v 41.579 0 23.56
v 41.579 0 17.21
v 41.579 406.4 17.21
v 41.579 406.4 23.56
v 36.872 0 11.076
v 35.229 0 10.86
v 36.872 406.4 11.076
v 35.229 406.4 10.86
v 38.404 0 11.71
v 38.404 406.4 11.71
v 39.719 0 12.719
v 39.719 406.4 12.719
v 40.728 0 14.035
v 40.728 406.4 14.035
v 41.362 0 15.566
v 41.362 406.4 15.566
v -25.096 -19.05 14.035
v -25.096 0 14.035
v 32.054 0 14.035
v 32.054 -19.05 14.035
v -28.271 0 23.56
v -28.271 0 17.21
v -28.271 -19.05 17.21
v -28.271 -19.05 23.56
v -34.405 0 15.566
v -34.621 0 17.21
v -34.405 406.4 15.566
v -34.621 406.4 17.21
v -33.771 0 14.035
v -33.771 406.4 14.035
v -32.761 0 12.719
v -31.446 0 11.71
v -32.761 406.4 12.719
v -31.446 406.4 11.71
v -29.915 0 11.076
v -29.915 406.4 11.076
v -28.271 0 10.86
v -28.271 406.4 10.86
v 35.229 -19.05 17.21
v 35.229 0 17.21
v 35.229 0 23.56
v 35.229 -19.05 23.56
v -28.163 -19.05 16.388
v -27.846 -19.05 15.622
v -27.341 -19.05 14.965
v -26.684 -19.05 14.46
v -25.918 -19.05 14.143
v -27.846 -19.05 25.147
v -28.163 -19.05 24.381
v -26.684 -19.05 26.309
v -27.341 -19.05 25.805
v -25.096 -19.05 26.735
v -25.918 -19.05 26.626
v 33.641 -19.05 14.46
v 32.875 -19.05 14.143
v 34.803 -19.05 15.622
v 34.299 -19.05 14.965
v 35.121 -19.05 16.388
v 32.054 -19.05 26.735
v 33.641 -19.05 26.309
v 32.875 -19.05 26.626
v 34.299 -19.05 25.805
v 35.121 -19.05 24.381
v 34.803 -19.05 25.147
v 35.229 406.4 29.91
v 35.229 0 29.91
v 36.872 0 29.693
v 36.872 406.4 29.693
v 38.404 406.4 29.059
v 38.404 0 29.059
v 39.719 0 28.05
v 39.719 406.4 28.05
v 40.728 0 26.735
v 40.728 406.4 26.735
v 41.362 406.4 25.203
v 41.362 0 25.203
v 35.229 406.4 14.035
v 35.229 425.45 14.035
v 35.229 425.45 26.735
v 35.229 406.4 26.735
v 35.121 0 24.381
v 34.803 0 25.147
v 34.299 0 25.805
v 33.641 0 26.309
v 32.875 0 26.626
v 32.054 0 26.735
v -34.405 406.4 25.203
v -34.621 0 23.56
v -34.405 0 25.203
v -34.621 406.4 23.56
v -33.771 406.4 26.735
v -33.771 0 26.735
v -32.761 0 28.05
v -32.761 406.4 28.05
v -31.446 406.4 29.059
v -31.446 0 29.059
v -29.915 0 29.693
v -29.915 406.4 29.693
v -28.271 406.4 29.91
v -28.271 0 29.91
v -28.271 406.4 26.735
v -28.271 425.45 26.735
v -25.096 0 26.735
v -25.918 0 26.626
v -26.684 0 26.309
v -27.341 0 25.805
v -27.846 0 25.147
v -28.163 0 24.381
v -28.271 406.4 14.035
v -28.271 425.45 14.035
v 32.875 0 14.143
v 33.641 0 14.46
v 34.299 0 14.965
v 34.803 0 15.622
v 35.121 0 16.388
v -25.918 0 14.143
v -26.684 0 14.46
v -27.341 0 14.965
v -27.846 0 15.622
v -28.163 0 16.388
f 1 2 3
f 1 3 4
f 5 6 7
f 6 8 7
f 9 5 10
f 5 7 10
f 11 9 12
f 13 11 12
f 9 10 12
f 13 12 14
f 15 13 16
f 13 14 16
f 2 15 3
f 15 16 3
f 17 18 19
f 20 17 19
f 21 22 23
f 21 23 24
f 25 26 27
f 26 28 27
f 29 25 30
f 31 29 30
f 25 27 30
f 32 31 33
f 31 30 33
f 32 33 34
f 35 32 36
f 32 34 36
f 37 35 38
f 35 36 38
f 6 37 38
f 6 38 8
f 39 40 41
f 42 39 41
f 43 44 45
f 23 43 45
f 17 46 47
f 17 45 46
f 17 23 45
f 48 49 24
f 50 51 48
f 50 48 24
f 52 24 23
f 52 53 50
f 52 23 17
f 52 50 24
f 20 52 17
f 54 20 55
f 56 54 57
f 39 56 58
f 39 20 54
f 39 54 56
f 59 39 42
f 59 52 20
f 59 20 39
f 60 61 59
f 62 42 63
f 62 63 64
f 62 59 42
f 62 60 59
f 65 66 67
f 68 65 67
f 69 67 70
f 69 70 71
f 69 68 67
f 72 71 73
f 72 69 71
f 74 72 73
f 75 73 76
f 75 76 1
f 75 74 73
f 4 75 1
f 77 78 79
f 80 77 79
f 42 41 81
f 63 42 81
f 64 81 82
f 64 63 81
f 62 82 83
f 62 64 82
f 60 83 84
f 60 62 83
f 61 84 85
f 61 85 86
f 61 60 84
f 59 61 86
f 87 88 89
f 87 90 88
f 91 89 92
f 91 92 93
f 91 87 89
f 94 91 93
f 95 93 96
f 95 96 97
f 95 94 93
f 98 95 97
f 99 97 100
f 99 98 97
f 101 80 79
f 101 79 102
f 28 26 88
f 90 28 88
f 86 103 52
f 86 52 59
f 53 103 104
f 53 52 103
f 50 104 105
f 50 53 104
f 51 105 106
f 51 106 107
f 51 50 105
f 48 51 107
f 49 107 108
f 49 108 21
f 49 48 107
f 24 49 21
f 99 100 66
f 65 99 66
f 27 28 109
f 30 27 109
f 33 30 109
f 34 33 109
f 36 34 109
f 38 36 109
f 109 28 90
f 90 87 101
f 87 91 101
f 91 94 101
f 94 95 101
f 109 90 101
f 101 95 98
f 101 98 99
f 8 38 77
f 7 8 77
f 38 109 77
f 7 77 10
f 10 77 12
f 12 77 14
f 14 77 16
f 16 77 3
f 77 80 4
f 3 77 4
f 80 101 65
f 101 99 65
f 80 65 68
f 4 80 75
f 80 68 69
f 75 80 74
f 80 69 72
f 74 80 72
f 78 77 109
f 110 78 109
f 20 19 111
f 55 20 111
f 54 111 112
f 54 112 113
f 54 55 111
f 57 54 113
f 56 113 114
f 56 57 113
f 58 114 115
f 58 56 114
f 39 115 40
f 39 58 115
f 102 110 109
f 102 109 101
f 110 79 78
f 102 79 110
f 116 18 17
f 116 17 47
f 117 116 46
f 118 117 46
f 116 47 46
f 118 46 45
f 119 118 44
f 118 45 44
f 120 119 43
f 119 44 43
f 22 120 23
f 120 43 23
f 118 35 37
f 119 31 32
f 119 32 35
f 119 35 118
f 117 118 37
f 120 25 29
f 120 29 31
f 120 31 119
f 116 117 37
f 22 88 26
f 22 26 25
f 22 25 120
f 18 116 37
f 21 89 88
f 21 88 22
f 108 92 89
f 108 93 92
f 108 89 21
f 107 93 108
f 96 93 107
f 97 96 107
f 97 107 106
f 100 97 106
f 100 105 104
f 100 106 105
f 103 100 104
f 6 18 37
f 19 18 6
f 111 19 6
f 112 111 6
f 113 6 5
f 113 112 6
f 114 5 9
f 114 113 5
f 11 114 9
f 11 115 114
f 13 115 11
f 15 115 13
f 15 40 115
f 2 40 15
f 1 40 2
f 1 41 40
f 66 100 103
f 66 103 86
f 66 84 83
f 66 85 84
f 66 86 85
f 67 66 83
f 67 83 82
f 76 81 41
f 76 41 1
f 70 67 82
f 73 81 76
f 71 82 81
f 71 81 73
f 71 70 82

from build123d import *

# Parameters (mm, degrees)
F0_W     = 76.2
F0_H     = 19.05
F1_DEPTH = 406.4
F2_W     = 63.5
F2_H     = 12.7
F3_DEPTH = 19.05
F4_R     = 6.35
F5_W     = 63.5
F5_H     = 12.7
F6_DEPTH = 19.05
F7_R     = 3.175


with BuildPart() as f1:
    # F0 (on Front) → F1 (new body)
    with BuildSketch(Plane.XZ):
        with Locations((3.478697, 20.384602)):
            Rectangle(F0_W, F0_H)
    extrude(amount=-F1_DEPTH)

    # F2 (on face) → F3 (join)
    with BuildSketch(Plane.XZ):
        with Locations((3.478697, 20.384602)):
            Rectangle(F2_W, F2_H)
    extrude(amount=F3_DEPTH)

    # F4
    f4_edges = [f1.edges().sort_by_distance(p)[0] for p in [
        (41.578697, 203.2, 29.909602),
        (41.578697, 203.2, 10.859602),
        (-34.621303, 203.2, 29.909602),
        (-34.621303, 203.2, 10.859602),
    ]]
    fillet(f4_edges, radius=F4_R)

    # F5 (on face) → F6 (join)
    with BuildSketch(Plane(origin=(0, 406.4, 0), x_dir=(-1, 0, 0), z_dir=(0, 1, 0))):
        with Locations((-3.478697, 20.384602)):
            Rectangle(F5_W, F5_H)
    extrude(amount=F6_DEPTH)

    # F7
    f7_edges = [f1.edges().sort_by_distance(p)[0] for p in [
        (35.228697, -9.525, 26.734602),
        (35.228697, -9.525, 14.034602),
        (-28.271303, -9.525, 26.734602),
        (-28.271303, -9.525, 14.034602),
    ]]
    fillet(f7_edges, radius=F7_R)


solid = f1.part
